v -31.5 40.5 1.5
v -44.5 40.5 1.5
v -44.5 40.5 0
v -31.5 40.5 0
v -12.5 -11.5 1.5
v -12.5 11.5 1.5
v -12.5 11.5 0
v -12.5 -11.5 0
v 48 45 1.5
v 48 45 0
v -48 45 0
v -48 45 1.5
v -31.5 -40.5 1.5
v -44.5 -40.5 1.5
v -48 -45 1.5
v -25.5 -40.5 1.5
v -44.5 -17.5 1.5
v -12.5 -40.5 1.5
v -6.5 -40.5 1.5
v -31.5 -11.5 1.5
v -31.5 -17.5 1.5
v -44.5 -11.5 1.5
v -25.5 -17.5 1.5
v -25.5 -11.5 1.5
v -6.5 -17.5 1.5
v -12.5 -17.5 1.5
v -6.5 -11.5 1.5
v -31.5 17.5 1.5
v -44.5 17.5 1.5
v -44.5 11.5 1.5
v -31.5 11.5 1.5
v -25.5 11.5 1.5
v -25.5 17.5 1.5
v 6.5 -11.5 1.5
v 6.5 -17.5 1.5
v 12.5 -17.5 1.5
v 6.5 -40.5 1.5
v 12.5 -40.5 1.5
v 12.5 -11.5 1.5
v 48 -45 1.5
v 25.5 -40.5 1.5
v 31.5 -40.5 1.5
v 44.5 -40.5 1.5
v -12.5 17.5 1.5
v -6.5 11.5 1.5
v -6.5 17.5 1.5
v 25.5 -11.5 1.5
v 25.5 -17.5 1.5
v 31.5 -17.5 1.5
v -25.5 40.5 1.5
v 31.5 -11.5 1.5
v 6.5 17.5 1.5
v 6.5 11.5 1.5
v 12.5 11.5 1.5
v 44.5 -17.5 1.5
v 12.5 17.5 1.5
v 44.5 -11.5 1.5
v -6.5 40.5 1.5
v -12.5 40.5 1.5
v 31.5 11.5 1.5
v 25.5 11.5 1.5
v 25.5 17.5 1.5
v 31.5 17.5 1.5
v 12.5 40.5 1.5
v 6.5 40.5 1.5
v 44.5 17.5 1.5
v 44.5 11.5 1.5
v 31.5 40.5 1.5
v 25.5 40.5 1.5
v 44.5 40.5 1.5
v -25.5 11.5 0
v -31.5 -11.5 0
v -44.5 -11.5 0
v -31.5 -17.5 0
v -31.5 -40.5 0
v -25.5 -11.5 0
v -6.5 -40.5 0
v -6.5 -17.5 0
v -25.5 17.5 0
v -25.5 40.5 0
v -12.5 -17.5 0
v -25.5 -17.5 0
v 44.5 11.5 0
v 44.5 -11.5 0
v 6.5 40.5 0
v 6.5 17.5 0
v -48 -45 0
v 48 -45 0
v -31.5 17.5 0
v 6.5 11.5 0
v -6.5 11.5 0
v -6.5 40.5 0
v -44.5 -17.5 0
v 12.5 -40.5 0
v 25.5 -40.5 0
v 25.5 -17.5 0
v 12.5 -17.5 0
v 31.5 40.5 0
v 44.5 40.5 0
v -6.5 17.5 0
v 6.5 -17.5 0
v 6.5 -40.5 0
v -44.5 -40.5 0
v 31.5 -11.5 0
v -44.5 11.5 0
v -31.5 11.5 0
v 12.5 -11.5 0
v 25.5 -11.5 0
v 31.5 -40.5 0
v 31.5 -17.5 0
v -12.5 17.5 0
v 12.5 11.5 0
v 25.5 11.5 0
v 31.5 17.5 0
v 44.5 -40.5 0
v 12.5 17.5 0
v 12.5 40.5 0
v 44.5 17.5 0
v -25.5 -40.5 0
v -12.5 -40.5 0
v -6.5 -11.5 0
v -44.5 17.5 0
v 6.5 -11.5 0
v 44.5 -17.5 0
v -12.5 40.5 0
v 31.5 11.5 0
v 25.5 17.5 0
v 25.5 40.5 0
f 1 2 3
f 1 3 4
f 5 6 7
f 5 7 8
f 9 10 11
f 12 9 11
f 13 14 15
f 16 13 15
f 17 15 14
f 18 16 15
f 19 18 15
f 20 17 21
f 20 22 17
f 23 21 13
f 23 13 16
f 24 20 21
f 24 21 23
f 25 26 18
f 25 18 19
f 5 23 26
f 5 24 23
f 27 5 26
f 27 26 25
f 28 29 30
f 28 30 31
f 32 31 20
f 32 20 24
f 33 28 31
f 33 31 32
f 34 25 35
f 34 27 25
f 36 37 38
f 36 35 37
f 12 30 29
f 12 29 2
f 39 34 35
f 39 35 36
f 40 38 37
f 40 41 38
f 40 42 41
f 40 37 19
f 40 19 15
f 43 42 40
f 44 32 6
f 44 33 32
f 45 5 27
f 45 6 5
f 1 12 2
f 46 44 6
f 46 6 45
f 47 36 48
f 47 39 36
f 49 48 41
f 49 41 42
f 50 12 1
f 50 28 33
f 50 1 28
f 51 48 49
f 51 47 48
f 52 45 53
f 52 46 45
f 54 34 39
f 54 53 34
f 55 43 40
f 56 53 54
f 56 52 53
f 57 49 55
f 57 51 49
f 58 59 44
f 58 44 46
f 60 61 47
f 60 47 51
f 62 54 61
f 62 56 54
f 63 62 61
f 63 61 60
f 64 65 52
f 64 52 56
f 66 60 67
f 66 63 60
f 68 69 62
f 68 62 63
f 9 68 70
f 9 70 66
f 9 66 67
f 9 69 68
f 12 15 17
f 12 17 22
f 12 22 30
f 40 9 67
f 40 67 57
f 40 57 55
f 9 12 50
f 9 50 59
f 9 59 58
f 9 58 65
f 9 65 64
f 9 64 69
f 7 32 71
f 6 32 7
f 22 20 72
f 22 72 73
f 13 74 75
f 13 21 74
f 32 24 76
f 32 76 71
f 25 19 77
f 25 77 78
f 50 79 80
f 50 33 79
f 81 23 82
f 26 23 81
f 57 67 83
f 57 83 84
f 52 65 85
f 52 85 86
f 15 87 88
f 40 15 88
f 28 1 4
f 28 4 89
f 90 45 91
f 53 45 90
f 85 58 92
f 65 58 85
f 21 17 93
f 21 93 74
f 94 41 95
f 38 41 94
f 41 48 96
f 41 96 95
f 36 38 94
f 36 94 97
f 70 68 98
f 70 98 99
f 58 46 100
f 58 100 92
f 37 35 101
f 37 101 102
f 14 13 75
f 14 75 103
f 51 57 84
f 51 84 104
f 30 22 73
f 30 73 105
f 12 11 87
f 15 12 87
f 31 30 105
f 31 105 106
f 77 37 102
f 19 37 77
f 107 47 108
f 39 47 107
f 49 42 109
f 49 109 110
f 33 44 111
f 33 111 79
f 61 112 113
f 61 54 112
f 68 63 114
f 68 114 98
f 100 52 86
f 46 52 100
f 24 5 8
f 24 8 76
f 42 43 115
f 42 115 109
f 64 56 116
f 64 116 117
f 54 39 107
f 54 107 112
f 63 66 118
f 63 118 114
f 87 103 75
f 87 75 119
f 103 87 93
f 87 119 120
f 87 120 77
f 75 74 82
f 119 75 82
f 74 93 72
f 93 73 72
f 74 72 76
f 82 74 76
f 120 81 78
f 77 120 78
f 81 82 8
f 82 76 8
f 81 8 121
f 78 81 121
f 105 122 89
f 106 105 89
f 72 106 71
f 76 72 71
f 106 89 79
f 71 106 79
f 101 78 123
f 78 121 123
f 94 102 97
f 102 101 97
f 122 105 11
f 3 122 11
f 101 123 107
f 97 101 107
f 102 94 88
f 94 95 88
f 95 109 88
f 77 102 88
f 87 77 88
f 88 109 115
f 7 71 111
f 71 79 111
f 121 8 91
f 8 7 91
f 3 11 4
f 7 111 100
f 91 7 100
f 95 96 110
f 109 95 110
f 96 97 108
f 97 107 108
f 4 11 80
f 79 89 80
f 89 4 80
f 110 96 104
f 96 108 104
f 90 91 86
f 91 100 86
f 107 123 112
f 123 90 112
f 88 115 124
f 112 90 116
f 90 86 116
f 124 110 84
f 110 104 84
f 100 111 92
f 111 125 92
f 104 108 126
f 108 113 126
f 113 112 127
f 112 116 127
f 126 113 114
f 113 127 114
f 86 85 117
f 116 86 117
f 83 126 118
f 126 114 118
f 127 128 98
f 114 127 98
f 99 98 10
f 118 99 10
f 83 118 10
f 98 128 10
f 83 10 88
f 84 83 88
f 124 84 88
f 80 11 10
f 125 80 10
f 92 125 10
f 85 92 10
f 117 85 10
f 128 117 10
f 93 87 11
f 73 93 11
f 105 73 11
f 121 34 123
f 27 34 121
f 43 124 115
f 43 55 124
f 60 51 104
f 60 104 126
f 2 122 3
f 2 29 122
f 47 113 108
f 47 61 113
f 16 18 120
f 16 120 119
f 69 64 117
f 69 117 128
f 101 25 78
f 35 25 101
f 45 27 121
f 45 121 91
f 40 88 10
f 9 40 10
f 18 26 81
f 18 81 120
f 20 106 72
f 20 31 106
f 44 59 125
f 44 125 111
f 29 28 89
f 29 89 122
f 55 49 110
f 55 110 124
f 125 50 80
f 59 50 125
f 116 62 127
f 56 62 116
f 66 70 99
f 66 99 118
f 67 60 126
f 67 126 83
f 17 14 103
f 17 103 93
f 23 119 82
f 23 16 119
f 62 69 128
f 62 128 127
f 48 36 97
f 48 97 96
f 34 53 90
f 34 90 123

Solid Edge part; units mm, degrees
sketch "Sketch1" plane through (0, 0, 0) normal (0, 0, 1) x (1, 0, 0)
  line L0 (-48, 45) -> (-48, -45)
  line L1 (-48, -45) -> (48, -45)
  line L2 (48, -45) -> (48, 45)
  line L3 (48, 45) -> (-48, 45)
extrude "Protrusion1" add sketch "Sketch1" along normal blind 1.5
sketch "Sketch2" plane through (0, 0, 0) normal (0, 0, -1) x (1, 0, 0)
  line L0 (-31.5, 17.5) -> (-31.5, 40.5)
  line L1 (-31.5, 40.5) -> (-44.5, 40.5)
  line L2 (-44.5, 40.5) -> (-44.5, 17.5)
  line L3 (-44.5, 17.5) -> (-31.5, 17.5)
  line L4 (-25.5, 17.5) -> (-12.5, 17.5)
  line L5 (-12.5, 17.5) -> (-12.5, 40.5)
  line L6 (-12.5, 40.5) -> (-25.5, 40.5)
  line L7 (-25.5, 40.5) -> (-25.5, 17.5)
  line L8 (-6.5, 17.5) -> (6.5, 17.5)
  line L9 (6.5, 17.5) -> (6.5, 40.5)
  line L10 (6.5, 40.5) -> (-6.5, 40.5)
  line L11 (-6.5, 40.5) -> (-6.5, 17.5)
  line L12 (12.5, 17.5) -> (25.5, 17.5)
  line L13 (25.5, 17.5) -> (25.5, 40.5)
  line L14 (25.5, 40.5) -> (12.5, 40.5)
  line L15 (12.5, 40.5) -> (12.5, 17.5)
  line L16 (31.5, 17.5) -> (44.5, 17.5)
  line L17 (44.5, 17.5) -> (44.5, 40.5)
  line L18 (44.5, 40.5) -> (31.5, 40.5)
  line L19 (31.5, 40.5) -> (31.5, 17.5)
  line L20 (44.5, 11.5) -> (31.5, 11.5)
  line L21 (31.5, 11.5) -> (31.5, -11.5)
  line L22 (31.5, -11.5) -> (44.5, -11.5)
  line L23 (44.5, -11.5) -> (44.5, 11.5)
  line L24 (25.5, 11.5) -> (12.5, 11.5)
  line L25 (12.5, 11.5) -> (12.5, -11.5)
  line L26 (12.5, -11.5) -> (25.5, -11.5)
  line L27 (25.5, -11.5) -> (25.5, 11.5)
  line L28 (6.5, 11.5) -> (-6.5, 11.5)
  line L29 (-6.5, 11.5) -> (-6.5, -11.5)
  line L30 (-6.5, -11.5) -> (6.5, -11.5)
  line L31 (6.5, -11.5) -> (6.5, 11.5)
  line L32 (-12.5, 11.5) -> (-25.5, 11.5)
  line L33 (-25.5, 11.5) -> (-25.5, -11.5)
  line L34 (-25.5, -11.5) -> (-12.5, -11.5)
  line L35 (-12.5, -11.5) -> (-12.5, 11.5)
  line L36 (-31.5, 11.5) -> (-44.5, 11.5)
  line L37 (-44.5, 11.5) -> (-44.5, -11.5)
  line L38 (-44.5, -11.5) -> (-31.5, -11.5)
  line L39 (-31.5, -11.5) -> (-31.5, 11.5)
  line L40 (-44.5, -17.5) -> (-44.5, -40.5)
  line L41 (-44.5, -40.5) -> (-31.5, -40.5)
  line L42 (-31.5, -40.5) -> (-31.5, -17.5)
  line L43 (-31.5, -17.5) -> (-44.5, -17.5)
  line L44 (-12.5, -17.5) -> (-25.5, -17.5)
  line L45 (-25.5, -17.5) -> (-25.5, -40.5)
  line L46 (-25.5, -40.5) -> (-12.5, -40.5)
  line L47 (-12.5, -40.5) -> (-12.5, -17.5)
  line L48 (-6.5, -17.5) -> (-6.5, -40.5)
  line L49 (-6.5, -40.5) -> (6.5, -40.5)
  line L50 (6.5, -40.5) -> (6.5, -17.5)
  line L51 (6.5, -17.5) -> (-6.5, -17.5)
  line L52 (12.5, -17.5) -> (12.5, -40.5)
  line L53 (12.5, -40.5) -> (25.5, -40.5)
  line L54 (25.5, -40.5) -> (25.5, -17.5)
  line L55 (25.5, -17.5) -> (12.5, -17.5)
  line L56 (31.5, -17.5) -> (31.5, -40.5)
  line L57 (31.5, -40.5) -> (44.5, -40.5)
  line L58 (44.5, -40.5) -> (44.5, -17.5)
  line L59 (44.5, -17.5) -> (31.5, -17.5)
extrude "ExtrudedCutout_1" cut sketch "Sketch2" along normal mid plane 80
